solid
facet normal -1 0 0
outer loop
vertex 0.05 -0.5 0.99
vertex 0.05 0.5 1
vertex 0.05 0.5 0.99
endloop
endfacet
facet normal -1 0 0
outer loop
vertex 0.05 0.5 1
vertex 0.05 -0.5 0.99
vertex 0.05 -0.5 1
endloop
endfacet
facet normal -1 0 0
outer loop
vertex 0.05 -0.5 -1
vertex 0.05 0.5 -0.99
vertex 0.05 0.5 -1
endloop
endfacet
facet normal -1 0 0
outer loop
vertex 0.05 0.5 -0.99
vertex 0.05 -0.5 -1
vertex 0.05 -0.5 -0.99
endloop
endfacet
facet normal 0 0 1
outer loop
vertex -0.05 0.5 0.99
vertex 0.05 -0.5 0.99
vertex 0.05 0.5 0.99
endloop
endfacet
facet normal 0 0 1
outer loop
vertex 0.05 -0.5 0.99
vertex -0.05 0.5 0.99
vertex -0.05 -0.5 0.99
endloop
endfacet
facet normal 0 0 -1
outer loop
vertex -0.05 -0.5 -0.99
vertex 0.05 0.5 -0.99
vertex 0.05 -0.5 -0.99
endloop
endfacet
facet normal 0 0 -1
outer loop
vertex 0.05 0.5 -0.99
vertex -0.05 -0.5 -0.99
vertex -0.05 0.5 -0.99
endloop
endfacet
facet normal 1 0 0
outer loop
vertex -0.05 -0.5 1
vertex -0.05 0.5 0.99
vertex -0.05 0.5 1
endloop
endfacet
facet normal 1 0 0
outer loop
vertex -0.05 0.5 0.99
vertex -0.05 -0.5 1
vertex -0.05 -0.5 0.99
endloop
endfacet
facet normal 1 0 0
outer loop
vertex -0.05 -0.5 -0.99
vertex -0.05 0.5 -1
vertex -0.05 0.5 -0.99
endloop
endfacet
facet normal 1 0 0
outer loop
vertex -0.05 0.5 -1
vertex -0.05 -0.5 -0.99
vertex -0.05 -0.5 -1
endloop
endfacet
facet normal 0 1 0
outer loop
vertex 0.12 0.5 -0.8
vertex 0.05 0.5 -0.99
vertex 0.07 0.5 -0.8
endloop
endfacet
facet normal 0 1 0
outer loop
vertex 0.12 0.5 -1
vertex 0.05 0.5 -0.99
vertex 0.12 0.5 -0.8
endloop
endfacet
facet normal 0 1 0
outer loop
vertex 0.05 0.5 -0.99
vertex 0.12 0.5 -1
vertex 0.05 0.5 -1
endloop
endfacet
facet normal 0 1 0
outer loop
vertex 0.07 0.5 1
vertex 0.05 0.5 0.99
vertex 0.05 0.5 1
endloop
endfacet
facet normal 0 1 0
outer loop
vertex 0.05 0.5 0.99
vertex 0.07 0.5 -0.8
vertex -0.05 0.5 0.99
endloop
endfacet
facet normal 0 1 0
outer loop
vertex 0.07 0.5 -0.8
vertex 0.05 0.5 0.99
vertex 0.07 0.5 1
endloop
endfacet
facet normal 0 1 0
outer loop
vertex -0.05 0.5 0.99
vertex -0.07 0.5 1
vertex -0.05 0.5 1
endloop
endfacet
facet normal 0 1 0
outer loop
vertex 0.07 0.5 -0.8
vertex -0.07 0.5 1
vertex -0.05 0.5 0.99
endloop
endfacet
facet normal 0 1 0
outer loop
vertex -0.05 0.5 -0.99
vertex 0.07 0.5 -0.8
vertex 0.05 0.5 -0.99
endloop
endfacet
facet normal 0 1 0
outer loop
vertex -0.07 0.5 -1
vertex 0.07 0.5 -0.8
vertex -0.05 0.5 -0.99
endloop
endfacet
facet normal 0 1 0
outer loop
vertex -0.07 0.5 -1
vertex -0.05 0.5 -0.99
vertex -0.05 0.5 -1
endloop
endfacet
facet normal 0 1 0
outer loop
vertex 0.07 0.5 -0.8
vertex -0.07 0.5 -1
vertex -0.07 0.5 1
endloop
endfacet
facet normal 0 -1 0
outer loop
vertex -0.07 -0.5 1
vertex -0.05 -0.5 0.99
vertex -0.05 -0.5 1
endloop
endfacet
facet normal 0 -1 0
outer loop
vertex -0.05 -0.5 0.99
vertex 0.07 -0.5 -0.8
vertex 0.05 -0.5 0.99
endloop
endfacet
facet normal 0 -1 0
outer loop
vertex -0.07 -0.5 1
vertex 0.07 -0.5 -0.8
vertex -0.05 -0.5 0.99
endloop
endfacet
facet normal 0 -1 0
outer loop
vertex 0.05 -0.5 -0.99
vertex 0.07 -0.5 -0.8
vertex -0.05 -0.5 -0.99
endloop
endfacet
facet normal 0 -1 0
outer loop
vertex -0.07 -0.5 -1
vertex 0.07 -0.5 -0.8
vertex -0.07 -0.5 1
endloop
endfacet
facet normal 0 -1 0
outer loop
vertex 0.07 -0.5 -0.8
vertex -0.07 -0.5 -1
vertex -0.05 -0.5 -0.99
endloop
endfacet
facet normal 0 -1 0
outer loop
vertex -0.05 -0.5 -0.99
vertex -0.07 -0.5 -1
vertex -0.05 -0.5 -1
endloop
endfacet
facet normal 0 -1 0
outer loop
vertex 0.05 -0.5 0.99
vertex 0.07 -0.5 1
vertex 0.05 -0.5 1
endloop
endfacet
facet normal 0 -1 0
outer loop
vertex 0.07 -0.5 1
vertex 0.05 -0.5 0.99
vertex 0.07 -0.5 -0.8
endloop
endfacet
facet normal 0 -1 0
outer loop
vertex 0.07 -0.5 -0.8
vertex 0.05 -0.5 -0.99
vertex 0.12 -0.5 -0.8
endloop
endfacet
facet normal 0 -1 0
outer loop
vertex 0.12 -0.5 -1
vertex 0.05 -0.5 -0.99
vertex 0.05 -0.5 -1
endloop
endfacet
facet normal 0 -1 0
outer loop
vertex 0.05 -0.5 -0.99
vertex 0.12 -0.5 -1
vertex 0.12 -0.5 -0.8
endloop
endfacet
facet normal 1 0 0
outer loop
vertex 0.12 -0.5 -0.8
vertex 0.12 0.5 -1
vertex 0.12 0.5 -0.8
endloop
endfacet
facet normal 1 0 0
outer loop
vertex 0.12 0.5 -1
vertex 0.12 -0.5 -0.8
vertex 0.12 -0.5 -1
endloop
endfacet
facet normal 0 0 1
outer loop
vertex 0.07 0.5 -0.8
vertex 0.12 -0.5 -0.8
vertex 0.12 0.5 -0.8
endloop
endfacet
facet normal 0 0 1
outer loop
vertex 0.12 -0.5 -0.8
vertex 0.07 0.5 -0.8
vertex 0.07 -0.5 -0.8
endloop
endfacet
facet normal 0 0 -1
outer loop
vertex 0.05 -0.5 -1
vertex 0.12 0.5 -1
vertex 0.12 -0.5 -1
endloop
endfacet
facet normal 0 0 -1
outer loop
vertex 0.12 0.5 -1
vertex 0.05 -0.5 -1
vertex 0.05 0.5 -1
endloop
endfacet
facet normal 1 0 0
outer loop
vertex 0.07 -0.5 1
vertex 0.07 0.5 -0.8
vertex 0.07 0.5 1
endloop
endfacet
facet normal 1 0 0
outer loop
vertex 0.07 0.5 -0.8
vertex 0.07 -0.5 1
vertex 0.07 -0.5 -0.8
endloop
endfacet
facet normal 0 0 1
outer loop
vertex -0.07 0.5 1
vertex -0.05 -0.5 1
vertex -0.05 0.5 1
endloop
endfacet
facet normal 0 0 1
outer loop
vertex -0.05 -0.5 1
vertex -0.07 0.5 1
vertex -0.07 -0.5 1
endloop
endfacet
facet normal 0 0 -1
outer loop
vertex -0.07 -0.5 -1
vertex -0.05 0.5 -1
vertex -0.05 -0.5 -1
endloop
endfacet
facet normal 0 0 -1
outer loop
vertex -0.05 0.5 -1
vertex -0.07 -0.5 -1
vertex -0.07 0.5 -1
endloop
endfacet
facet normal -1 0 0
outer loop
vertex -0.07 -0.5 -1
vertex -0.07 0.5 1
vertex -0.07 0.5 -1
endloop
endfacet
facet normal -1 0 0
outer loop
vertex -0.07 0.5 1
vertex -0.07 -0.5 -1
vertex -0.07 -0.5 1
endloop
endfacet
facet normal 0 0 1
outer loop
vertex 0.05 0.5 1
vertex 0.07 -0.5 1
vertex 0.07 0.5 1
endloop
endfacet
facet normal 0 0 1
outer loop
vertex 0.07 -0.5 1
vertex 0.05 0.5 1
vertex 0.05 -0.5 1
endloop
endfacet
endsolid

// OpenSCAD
module Wall_01(col = 0, rot = 0){

    rotate([0,0,90 * rot]){
    
    translate([-0.06,0,0])
    color("white")
    cube([0.02,1,2], center= true);
    
    color("#295f48")
    translate([0.06,0,0])
    color("white")
    cube([0.02,1,2], center= true);
    
    
    color("#b2b2b2"){
    cube([0.1,1,1.98], center= true);
    
    translate([0.095,0,-0.9])    
    color("gray")
    cube([0.05,1,0.2], center= true);
    }
    }
}

Wall_01();

// Written by Nicolì Angelo (Gengio) 2024: 
// MIT License

//Permission is hereby granted, free of charge, to any person obtaining a copy of this software and associated documentation files (the "Software"), to deal in the Software without restriction, including without limitation the rights to use, copy, modify, merge, publish, distribute, sublicense, and/or sell copies of the Software, and to permit persons to whom the Software is furnished to do so, subject to the following conditions:

//The above copyright notice and this permission notice shall be included in all copies or substantial portions of the Software.

//THE SOFTWARE IS PROVIDED "AS IS", WITHOUT WARRANTY OF ANY KIND, EXPRESS OR IMPLIED, INCLUDING BUT NOT LIMITED TO THE WARRANTIES OF MERCHANTABILITY, FITNESS FOR A PARTICULAR PURPOSE AND NONINFRINGEMENT. IN NO EVENT SHALL THE AUTHORS OR COPYRIGHT HOLDERS BE LIABLE FOR ANY CLAIM, DAMAGES OR OTHER LIABILITY, WHETHER IN AN ACTION OF CONTRACT, TORT OR OTHERWISE, ARISING FROM, OUT OF OR IN CONNECTION WITH THE SOFTWARE OR THE USE OR OTHER DEALINGS IN THE SOFTWARE.
